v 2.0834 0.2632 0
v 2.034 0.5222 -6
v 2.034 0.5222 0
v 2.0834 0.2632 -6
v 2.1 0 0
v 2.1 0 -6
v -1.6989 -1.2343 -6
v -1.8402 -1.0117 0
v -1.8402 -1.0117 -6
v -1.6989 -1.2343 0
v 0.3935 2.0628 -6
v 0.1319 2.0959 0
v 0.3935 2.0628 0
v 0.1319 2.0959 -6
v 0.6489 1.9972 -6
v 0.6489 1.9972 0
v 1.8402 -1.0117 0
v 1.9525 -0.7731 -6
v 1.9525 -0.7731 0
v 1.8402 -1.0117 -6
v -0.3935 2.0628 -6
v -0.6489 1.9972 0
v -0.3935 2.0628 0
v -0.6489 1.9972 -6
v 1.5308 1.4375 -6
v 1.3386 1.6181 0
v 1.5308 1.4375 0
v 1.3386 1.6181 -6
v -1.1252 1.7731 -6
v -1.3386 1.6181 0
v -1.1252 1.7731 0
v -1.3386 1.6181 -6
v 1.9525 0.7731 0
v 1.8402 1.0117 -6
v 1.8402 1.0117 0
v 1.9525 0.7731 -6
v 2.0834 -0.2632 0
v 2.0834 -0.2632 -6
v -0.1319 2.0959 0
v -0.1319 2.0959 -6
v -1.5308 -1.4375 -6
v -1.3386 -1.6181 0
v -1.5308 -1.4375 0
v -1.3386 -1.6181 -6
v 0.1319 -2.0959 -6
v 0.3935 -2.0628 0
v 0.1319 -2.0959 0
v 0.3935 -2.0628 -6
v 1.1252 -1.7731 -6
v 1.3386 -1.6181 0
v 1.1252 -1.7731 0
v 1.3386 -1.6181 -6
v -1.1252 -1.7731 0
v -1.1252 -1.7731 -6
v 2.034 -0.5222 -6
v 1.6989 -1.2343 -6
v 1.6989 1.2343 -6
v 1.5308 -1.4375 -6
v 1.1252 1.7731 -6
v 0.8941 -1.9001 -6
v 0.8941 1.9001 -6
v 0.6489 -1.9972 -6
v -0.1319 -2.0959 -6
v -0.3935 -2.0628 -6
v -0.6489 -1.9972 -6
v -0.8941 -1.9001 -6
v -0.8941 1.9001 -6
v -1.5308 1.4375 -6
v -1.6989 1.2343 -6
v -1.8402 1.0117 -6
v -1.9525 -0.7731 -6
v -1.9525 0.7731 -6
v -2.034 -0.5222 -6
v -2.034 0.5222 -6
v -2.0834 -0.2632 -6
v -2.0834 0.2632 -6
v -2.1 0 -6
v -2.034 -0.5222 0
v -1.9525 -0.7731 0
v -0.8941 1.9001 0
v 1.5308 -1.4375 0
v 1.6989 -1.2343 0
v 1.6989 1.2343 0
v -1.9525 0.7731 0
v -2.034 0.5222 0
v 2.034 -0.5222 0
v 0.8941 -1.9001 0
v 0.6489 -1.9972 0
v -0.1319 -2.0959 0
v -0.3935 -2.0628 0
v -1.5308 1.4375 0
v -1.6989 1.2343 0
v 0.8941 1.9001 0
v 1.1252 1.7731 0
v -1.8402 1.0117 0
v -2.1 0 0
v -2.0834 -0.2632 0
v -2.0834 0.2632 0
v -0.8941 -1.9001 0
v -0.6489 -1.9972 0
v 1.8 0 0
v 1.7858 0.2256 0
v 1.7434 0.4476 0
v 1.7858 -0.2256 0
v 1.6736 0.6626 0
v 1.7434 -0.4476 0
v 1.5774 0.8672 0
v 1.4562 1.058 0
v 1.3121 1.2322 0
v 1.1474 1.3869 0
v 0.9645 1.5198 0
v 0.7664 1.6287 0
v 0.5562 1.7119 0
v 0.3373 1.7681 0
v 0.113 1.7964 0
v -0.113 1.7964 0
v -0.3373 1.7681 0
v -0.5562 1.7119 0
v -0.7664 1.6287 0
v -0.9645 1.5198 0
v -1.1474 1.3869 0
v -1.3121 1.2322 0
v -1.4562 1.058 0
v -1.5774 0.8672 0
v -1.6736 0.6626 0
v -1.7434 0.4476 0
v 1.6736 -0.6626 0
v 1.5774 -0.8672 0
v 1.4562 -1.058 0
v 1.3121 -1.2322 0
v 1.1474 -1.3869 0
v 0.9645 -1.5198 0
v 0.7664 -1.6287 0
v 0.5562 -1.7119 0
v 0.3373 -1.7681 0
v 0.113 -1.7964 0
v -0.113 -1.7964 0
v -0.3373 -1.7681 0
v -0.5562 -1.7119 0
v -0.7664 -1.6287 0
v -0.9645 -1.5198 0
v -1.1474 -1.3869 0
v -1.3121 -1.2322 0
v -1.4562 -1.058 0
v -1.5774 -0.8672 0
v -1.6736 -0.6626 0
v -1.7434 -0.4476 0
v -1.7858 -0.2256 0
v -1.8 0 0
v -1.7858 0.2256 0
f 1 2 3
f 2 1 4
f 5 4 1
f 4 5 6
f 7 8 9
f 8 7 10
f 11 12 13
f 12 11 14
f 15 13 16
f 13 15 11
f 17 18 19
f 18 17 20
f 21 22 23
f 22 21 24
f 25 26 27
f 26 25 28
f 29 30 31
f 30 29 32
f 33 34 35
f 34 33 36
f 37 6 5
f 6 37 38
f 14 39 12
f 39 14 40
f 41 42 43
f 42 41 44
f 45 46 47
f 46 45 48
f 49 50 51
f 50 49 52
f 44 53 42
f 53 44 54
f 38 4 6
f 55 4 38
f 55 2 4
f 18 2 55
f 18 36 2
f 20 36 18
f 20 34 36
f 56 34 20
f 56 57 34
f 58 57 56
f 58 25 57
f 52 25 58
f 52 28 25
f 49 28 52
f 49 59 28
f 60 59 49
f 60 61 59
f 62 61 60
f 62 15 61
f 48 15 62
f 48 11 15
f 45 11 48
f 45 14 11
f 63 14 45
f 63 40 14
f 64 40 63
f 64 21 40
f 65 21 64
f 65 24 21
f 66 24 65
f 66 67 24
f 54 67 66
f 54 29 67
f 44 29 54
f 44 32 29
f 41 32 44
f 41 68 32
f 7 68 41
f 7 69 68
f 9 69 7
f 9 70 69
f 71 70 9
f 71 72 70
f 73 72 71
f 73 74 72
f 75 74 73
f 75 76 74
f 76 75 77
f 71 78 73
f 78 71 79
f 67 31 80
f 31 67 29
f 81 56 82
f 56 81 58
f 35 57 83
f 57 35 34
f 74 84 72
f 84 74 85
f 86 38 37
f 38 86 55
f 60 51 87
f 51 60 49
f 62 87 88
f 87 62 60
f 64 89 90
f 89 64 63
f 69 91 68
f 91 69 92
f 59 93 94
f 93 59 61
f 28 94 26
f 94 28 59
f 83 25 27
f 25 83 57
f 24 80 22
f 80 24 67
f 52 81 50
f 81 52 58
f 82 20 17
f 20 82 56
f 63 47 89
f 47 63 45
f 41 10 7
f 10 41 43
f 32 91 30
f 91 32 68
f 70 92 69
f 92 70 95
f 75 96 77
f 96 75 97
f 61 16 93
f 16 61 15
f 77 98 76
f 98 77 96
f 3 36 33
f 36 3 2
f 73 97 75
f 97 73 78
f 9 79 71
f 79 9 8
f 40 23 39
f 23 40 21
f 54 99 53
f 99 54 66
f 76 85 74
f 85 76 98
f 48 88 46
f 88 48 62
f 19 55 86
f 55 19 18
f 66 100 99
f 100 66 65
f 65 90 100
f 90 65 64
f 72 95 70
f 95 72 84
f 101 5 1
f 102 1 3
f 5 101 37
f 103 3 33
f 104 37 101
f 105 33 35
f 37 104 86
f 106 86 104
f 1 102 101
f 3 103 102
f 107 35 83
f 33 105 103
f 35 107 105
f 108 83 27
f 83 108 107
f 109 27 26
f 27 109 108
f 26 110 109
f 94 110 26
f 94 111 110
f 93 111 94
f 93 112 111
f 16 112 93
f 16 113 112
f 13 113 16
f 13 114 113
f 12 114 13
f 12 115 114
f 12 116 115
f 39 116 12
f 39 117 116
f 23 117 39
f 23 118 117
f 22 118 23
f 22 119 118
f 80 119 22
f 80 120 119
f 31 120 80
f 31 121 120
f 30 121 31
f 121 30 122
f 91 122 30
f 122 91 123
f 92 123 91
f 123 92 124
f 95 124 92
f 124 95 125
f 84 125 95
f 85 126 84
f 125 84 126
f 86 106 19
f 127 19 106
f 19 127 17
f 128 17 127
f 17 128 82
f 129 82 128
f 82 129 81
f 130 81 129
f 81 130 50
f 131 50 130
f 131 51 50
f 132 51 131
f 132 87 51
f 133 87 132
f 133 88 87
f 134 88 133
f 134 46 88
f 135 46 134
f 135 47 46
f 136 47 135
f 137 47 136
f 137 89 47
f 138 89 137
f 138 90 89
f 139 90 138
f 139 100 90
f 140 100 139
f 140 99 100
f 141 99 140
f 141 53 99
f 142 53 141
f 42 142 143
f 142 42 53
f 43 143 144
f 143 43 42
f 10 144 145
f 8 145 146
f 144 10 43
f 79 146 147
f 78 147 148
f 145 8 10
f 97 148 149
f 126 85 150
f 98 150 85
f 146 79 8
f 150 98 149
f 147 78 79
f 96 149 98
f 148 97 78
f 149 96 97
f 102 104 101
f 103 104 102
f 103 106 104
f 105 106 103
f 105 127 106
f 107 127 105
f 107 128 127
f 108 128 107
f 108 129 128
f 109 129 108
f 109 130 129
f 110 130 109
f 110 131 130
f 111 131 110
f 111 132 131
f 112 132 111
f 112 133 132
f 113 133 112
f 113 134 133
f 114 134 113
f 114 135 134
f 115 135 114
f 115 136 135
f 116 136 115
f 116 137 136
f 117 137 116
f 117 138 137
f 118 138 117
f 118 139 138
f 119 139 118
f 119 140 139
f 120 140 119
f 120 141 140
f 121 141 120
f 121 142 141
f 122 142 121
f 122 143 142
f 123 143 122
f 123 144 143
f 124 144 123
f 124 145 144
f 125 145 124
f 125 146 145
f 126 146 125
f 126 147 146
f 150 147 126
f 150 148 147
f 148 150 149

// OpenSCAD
$fn = 50;


difference() {
	union() {
		translate(v = [0, 0, -6.0000000000]) {
			cylinder(h = 6, r = 2.1000000000);
		}
		translate(v = [0, 0, -6.0000000000]) {
			cylinder(h = 6, r = 2.1000000000);
		}
		translate(v = [0, 0, -6.0000000000]) {
			cylinder(h = 6, r = 2.1000000000);
		}
	}
	union() {
		cylinder(h = 100, r = 1.8000000000);
	}
}
